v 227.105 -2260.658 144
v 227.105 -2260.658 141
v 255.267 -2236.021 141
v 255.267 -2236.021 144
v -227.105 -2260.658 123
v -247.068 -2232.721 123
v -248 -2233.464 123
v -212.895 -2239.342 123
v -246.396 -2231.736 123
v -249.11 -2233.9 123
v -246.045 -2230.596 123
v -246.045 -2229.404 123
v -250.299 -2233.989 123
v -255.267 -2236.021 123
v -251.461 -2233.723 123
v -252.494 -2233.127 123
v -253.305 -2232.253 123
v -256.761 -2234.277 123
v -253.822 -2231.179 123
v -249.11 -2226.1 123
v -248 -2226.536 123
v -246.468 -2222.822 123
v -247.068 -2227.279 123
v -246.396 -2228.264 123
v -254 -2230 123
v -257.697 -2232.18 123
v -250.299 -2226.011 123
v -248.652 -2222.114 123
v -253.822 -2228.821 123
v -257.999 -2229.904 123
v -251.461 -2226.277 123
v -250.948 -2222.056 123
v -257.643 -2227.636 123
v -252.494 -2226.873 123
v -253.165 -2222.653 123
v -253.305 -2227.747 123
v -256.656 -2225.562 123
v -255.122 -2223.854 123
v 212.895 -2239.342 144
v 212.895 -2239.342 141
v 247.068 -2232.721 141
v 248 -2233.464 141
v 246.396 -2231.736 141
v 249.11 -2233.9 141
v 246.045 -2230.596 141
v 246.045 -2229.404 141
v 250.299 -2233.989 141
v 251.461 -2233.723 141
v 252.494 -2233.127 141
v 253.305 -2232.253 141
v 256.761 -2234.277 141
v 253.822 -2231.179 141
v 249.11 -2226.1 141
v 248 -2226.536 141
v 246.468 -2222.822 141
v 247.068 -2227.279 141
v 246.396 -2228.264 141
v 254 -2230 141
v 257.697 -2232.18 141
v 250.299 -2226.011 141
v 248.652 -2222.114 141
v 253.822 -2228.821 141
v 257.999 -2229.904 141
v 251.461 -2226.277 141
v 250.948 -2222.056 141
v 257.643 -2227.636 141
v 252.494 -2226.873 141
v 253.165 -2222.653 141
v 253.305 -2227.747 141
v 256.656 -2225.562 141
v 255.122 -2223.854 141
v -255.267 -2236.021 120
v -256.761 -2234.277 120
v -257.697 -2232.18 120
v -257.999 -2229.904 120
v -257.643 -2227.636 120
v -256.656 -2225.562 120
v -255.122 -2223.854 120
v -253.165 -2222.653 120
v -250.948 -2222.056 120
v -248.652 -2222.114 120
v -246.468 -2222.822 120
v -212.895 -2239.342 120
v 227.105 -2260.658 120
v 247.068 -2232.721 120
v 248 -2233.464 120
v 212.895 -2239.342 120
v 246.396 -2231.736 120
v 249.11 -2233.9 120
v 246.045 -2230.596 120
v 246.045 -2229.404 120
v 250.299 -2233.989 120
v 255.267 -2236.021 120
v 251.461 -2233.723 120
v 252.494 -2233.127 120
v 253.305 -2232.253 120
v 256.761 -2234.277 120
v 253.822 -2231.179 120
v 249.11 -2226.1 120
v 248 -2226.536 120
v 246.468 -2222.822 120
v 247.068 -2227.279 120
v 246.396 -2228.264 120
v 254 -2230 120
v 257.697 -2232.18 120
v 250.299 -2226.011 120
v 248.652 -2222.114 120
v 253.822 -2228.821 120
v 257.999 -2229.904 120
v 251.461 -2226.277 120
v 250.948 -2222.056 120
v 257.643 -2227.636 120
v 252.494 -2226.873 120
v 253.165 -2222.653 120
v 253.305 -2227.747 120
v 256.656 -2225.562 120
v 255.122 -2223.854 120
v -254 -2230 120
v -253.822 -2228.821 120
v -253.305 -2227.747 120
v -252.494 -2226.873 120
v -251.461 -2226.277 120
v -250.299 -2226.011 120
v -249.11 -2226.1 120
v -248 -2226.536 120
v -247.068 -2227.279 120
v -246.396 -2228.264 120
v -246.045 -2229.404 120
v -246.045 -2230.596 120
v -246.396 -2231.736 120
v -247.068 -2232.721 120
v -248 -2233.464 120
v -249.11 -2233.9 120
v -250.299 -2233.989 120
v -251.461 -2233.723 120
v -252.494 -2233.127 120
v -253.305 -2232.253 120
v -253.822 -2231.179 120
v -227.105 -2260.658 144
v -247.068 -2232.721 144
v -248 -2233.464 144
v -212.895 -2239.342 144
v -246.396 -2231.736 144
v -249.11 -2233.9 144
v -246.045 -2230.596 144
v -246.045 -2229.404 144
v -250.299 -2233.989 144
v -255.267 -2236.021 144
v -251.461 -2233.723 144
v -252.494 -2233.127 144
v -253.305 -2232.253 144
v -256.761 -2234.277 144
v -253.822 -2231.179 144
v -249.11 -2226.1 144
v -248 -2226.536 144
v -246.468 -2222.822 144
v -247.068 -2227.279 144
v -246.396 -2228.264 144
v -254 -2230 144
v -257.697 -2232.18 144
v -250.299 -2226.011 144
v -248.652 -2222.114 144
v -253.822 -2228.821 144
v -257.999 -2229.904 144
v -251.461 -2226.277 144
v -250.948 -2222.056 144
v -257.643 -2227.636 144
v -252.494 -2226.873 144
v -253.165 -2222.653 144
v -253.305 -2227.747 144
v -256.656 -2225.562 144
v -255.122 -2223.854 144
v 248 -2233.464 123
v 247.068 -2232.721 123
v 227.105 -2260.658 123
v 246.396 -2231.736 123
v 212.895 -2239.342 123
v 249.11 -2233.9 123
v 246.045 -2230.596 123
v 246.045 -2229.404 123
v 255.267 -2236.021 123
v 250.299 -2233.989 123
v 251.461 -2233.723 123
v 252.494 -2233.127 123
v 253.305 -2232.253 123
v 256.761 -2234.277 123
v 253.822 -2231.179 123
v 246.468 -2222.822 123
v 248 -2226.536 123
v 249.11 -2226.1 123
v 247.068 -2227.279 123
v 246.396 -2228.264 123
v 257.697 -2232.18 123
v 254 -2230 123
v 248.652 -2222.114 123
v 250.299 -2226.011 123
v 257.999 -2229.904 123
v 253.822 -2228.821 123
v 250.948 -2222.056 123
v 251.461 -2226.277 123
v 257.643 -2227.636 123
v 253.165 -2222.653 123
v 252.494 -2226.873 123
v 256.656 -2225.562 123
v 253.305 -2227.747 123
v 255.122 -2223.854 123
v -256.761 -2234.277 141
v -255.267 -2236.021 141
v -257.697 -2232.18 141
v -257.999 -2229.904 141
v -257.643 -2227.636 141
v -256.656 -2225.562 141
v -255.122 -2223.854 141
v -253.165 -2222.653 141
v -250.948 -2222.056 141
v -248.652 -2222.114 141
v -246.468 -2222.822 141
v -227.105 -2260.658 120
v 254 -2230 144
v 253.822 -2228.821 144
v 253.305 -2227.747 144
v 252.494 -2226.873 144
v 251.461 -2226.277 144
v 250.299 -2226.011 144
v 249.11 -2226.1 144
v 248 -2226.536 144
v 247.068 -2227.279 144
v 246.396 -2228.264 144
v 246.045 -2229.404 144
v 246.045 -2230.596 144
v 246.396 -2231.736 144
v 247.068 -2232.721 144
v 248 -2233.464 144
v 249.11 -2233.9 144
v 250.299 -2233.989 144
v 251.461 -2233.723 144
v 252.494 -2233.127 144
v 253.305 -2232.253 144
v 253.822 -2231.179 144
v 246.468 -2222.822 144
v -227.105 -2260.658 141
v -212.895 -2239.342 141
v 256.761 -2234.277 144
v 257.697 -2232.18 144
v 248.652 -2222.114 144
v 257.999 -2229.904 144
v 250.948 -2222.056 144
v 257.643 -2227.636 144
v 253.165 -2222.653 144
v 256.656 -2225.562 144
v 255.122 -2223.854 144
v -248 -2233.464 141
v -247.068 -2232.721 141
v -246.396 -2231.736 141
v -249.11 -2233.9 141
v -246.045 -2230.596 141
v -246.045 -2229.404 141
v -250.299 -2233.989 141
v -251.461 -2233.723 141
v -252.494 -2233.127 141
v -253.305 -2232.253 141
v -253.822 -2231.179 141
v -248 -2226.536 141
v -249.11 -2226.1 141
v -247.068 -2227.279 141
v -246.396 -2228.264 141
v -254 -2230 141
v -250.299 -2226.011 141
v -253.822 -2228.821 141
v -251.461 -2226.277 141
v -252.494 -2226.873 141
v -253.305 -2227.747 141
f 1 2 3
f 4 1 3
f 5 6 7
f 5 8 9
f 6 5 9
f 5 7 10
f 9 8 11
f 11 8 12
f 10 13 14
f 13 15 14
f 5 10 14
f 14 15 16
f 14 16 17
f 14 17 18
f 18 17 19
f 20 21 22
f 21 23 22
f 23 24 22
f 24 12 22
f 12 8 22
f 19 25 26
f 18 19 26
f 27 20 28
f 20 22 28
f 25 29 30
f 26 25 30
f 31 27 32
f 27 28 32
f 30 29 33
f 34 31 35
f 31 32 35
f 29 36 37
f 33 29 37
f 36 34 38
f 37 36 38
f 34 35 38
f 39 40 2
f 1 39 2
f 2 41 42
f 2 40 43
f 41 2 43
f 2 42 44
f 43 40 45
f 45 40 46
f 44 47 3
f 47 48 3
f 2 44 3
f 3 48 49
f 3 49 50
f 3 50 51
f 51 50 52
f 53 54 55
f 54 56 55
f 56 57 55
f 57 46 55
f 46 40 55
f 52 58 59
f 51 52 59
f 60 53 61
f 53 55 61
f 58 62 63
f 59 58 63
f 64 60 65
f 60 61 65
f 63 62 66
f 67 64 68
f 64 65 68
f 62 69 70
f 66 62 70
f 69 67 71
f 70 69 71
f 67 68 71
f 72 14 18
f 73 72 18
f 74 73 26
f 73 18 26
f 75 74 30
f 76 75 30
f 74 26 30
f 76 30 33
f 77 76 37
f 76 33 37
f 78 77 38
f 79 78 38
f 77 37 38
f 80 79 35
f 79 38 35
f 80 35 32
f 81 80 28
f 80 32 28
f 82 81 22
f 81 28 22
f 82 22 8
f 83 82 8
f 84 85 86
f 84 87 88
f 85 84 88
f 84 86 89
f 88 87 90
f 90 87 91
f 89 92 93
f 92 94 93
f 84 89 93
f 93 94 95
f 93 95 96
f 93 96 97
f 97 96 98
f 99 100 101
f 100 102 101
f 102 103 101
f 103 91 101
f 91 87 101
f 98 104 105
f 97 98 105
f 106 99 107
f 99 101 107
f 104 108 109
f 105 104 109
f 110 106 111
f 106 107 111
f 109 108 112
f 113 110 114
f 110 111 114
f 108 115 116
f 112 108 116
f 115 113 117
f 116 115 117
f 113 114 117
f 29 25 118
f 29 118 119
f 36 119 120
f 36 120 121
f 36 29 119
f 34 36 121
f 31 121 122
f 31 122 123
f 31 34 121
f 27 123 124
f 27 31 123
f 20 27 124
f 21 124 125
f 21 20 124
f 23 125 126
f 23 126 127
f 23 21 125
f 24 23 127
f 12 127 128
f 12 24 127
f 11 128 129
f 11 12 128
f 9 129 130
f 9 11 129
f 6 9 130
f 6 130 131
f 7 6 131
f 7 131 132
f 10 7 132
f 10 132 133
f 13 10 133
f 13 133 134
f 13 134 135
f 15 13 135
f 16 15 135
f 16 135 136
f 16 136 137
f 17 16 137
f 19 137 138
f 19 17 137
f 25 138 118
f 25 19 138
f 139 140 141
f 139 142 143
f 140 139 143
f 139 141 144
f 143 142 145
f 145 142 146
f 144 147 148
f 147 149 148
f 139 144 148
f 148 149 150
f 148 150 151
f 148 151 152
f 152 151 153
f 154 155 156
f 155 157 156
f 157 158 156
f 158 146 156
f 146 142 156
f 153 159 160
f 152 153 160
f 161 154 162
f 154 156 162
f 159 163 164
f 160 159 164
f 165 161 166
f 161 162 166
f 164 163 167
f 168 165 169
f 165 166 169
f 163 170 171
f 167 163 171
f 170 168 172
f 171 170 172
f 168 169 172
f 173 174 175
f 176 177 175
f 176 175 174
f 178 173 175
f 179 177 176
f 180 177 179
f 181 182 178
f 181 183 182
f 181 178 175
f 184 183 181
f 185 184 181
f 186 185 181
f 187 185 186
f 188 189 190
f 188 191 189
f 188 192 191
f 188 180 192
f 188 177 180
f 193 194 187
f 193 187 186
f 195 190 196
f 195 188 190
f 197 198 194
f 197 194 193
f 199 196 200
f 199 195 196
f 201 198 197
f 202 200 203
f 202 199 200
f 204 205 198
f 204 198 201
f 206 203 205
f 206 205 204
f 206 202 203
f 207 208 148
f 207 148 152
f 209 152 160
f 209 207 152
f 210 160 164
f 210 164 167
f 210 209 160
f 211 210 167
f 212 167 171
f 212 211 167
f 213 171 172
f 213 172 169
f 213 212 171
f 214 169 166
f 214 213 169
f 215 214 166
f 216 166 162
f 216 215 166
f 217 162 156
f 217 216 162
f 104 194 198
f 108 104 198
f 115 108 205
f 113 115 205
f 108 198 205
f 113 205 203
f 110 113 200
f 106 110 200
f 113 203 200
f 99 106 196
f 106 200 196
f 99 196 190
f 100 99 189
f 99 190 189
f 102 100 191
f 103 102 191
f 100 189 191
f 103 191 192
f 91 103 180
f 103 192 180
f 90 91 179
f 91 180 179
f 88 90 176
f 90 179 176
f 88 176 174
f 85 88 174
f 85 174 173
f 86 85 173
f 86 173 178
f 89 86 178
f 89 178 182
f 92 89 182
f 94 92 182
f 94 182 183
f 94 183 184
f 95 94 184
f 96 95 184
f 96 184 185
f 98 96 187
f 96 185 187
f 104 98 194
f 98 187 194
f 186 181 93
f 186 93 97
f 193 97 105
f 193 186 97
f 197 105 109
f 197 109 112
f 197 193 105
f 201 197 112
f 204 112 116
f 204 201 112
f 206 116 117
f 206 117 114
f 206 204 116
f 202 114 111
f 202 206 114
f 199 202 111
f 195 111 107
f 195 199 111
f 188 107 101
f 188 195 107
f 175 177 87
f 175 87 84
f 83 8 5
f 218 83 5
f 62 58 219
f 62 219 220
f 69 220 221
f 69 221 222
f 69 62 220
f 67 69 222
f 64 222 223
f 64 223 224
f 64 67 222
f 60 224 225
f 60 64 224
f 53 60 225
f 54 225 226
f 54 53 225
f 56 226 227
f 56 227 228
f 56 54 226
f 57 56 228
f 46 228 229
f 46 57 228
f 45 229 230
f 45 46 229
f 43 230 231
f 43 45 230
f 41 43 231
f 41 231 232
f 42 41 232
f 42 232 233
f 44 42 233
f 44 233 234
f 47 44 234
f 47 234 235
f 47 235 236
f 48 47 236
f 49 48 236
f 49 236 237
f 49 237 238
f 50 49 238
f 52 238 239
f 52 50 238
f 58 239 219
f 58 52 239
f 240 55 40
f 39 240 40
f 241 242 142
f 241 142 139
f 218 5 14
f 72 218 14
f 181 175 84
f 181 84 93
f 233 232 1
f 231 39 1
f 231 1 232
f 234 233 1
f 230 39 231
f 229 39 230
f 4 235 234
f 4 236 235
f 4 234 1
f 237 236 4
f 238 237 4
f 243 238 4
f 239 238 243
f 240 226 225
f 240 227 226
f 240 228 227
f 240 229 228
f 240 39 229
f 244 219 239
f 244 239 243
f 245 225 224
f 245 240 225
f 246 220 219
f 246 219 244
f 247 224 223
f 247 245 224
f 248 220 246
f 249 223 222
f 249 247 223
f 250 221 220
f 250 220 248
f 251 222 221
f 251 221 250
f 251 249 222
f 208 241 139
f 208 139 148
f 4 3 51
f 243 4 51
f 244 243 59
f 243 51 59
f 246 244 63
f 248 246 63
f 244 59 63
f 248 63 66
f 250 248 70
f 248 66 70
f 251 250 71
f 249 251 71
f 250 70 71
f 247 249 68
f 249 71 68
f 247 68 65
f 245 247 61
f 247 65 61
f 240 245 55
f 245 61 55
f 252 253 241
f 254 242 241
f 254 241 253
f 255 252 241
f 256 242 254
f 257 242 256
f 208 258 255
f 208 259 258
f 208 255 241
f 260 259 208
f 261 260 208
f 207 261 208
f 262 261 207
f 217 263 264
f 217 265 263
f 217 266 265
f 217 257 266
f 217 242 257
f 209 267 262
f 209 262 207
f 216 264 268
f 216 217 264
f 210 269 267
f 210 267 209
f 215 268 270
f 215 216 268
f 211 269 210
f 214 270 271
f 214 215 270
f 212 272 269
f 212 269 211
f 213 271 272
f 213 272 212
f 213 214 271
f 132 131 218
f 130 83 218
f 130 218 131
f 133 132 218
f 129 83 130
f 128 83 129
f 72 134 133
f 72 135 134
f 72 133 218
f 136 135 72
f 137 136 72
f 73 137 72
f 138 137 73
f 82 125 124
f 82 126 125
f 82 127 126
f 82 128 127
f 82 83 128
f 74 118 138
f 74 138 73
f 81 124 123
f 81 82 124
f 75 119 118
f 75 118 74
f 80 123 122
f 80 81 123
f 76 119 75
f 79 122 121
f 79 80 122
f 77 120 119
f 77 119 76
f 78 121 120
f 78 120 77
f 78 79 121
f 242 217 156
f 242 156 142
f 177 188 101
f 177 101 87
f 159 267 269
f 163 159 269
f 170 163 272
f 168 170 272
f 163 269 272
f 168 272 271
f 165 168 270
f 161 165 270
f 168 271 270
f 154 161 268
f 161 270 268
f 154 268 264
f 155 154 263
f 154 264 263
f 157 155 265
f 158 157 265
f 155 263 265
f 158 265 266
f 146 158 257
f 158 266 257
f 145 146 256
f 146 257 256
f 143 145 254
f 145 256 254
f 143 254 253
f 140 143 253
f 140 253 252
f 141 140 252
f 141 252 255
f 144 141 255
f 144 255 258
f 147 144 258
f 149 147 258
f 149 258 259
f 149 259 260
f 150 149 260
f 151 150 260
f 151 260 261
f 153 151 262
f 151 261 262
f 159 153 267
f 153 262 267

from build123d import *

# Parameters (mm, degrees)
BOSS_EXTRUDE1_START     = 141
BOSS_EXTRUDE1_OUTLINE_R = 4
BOSS_EXTRUDE1_DEPTH     = 3


# Read off the part's stored shape, not the designer's step: Boss-Extrude1
with BuildPart() as part:
    # Boss-Extrude1 outline → Boss-Extrude1 (new body)
    with BuildSketch(Plane.XY.offset(BOSS_EXTRUDE1_START)):
        with BuildLine():
            Line((212.894680975, -2239.342021462), (227.105319025, -2260.657978538))
            Line((227.105319025, -2260.657978538), (255.267429793, -2236.02114469))
            ThreePointArc((255.267429793, -2236.02114469), (256.656402355, -2225.56239843), (246.467954822, -2222.821932233))
            Line((246.467954822, -2222.821932233), (212.894680975, -2239.342021462))
        make_face()
        with Locations((250, -2230)):
            Circle(BOSS_EXTRUDE1_OUTLINE_R, mode=Mode.SUBTRACT)
    extrude(amount=BOSS_EXTRUDE1_DEPTH)


with BuildPart() as body_2:
    # Mirror1: mirrored copy
    add(part.part.mirror(Plane(origin=(0, 0, 132), x_dir=(1, 0, 0), z_dir=(0, 0, -1))))


with BuildPart() as body_3:
    # Mirror2: mirrored copy
    add(part.part.mirror(Plane(origin=(0, 0, 0), x_dir=(0, 0, 1), z_dir=(1, 0, 0))))


with BuildPart() as body_4:
    # Mirror2 2: mirrored copy
    add(body_2.part.mirror(Plane(origin=(0, 0, 0), x_dir=(0, 0, 1), z_dir=(1, 0, 0))))


solid = Compound([part.part, body_2.part, body_3.part, body_4.part])
